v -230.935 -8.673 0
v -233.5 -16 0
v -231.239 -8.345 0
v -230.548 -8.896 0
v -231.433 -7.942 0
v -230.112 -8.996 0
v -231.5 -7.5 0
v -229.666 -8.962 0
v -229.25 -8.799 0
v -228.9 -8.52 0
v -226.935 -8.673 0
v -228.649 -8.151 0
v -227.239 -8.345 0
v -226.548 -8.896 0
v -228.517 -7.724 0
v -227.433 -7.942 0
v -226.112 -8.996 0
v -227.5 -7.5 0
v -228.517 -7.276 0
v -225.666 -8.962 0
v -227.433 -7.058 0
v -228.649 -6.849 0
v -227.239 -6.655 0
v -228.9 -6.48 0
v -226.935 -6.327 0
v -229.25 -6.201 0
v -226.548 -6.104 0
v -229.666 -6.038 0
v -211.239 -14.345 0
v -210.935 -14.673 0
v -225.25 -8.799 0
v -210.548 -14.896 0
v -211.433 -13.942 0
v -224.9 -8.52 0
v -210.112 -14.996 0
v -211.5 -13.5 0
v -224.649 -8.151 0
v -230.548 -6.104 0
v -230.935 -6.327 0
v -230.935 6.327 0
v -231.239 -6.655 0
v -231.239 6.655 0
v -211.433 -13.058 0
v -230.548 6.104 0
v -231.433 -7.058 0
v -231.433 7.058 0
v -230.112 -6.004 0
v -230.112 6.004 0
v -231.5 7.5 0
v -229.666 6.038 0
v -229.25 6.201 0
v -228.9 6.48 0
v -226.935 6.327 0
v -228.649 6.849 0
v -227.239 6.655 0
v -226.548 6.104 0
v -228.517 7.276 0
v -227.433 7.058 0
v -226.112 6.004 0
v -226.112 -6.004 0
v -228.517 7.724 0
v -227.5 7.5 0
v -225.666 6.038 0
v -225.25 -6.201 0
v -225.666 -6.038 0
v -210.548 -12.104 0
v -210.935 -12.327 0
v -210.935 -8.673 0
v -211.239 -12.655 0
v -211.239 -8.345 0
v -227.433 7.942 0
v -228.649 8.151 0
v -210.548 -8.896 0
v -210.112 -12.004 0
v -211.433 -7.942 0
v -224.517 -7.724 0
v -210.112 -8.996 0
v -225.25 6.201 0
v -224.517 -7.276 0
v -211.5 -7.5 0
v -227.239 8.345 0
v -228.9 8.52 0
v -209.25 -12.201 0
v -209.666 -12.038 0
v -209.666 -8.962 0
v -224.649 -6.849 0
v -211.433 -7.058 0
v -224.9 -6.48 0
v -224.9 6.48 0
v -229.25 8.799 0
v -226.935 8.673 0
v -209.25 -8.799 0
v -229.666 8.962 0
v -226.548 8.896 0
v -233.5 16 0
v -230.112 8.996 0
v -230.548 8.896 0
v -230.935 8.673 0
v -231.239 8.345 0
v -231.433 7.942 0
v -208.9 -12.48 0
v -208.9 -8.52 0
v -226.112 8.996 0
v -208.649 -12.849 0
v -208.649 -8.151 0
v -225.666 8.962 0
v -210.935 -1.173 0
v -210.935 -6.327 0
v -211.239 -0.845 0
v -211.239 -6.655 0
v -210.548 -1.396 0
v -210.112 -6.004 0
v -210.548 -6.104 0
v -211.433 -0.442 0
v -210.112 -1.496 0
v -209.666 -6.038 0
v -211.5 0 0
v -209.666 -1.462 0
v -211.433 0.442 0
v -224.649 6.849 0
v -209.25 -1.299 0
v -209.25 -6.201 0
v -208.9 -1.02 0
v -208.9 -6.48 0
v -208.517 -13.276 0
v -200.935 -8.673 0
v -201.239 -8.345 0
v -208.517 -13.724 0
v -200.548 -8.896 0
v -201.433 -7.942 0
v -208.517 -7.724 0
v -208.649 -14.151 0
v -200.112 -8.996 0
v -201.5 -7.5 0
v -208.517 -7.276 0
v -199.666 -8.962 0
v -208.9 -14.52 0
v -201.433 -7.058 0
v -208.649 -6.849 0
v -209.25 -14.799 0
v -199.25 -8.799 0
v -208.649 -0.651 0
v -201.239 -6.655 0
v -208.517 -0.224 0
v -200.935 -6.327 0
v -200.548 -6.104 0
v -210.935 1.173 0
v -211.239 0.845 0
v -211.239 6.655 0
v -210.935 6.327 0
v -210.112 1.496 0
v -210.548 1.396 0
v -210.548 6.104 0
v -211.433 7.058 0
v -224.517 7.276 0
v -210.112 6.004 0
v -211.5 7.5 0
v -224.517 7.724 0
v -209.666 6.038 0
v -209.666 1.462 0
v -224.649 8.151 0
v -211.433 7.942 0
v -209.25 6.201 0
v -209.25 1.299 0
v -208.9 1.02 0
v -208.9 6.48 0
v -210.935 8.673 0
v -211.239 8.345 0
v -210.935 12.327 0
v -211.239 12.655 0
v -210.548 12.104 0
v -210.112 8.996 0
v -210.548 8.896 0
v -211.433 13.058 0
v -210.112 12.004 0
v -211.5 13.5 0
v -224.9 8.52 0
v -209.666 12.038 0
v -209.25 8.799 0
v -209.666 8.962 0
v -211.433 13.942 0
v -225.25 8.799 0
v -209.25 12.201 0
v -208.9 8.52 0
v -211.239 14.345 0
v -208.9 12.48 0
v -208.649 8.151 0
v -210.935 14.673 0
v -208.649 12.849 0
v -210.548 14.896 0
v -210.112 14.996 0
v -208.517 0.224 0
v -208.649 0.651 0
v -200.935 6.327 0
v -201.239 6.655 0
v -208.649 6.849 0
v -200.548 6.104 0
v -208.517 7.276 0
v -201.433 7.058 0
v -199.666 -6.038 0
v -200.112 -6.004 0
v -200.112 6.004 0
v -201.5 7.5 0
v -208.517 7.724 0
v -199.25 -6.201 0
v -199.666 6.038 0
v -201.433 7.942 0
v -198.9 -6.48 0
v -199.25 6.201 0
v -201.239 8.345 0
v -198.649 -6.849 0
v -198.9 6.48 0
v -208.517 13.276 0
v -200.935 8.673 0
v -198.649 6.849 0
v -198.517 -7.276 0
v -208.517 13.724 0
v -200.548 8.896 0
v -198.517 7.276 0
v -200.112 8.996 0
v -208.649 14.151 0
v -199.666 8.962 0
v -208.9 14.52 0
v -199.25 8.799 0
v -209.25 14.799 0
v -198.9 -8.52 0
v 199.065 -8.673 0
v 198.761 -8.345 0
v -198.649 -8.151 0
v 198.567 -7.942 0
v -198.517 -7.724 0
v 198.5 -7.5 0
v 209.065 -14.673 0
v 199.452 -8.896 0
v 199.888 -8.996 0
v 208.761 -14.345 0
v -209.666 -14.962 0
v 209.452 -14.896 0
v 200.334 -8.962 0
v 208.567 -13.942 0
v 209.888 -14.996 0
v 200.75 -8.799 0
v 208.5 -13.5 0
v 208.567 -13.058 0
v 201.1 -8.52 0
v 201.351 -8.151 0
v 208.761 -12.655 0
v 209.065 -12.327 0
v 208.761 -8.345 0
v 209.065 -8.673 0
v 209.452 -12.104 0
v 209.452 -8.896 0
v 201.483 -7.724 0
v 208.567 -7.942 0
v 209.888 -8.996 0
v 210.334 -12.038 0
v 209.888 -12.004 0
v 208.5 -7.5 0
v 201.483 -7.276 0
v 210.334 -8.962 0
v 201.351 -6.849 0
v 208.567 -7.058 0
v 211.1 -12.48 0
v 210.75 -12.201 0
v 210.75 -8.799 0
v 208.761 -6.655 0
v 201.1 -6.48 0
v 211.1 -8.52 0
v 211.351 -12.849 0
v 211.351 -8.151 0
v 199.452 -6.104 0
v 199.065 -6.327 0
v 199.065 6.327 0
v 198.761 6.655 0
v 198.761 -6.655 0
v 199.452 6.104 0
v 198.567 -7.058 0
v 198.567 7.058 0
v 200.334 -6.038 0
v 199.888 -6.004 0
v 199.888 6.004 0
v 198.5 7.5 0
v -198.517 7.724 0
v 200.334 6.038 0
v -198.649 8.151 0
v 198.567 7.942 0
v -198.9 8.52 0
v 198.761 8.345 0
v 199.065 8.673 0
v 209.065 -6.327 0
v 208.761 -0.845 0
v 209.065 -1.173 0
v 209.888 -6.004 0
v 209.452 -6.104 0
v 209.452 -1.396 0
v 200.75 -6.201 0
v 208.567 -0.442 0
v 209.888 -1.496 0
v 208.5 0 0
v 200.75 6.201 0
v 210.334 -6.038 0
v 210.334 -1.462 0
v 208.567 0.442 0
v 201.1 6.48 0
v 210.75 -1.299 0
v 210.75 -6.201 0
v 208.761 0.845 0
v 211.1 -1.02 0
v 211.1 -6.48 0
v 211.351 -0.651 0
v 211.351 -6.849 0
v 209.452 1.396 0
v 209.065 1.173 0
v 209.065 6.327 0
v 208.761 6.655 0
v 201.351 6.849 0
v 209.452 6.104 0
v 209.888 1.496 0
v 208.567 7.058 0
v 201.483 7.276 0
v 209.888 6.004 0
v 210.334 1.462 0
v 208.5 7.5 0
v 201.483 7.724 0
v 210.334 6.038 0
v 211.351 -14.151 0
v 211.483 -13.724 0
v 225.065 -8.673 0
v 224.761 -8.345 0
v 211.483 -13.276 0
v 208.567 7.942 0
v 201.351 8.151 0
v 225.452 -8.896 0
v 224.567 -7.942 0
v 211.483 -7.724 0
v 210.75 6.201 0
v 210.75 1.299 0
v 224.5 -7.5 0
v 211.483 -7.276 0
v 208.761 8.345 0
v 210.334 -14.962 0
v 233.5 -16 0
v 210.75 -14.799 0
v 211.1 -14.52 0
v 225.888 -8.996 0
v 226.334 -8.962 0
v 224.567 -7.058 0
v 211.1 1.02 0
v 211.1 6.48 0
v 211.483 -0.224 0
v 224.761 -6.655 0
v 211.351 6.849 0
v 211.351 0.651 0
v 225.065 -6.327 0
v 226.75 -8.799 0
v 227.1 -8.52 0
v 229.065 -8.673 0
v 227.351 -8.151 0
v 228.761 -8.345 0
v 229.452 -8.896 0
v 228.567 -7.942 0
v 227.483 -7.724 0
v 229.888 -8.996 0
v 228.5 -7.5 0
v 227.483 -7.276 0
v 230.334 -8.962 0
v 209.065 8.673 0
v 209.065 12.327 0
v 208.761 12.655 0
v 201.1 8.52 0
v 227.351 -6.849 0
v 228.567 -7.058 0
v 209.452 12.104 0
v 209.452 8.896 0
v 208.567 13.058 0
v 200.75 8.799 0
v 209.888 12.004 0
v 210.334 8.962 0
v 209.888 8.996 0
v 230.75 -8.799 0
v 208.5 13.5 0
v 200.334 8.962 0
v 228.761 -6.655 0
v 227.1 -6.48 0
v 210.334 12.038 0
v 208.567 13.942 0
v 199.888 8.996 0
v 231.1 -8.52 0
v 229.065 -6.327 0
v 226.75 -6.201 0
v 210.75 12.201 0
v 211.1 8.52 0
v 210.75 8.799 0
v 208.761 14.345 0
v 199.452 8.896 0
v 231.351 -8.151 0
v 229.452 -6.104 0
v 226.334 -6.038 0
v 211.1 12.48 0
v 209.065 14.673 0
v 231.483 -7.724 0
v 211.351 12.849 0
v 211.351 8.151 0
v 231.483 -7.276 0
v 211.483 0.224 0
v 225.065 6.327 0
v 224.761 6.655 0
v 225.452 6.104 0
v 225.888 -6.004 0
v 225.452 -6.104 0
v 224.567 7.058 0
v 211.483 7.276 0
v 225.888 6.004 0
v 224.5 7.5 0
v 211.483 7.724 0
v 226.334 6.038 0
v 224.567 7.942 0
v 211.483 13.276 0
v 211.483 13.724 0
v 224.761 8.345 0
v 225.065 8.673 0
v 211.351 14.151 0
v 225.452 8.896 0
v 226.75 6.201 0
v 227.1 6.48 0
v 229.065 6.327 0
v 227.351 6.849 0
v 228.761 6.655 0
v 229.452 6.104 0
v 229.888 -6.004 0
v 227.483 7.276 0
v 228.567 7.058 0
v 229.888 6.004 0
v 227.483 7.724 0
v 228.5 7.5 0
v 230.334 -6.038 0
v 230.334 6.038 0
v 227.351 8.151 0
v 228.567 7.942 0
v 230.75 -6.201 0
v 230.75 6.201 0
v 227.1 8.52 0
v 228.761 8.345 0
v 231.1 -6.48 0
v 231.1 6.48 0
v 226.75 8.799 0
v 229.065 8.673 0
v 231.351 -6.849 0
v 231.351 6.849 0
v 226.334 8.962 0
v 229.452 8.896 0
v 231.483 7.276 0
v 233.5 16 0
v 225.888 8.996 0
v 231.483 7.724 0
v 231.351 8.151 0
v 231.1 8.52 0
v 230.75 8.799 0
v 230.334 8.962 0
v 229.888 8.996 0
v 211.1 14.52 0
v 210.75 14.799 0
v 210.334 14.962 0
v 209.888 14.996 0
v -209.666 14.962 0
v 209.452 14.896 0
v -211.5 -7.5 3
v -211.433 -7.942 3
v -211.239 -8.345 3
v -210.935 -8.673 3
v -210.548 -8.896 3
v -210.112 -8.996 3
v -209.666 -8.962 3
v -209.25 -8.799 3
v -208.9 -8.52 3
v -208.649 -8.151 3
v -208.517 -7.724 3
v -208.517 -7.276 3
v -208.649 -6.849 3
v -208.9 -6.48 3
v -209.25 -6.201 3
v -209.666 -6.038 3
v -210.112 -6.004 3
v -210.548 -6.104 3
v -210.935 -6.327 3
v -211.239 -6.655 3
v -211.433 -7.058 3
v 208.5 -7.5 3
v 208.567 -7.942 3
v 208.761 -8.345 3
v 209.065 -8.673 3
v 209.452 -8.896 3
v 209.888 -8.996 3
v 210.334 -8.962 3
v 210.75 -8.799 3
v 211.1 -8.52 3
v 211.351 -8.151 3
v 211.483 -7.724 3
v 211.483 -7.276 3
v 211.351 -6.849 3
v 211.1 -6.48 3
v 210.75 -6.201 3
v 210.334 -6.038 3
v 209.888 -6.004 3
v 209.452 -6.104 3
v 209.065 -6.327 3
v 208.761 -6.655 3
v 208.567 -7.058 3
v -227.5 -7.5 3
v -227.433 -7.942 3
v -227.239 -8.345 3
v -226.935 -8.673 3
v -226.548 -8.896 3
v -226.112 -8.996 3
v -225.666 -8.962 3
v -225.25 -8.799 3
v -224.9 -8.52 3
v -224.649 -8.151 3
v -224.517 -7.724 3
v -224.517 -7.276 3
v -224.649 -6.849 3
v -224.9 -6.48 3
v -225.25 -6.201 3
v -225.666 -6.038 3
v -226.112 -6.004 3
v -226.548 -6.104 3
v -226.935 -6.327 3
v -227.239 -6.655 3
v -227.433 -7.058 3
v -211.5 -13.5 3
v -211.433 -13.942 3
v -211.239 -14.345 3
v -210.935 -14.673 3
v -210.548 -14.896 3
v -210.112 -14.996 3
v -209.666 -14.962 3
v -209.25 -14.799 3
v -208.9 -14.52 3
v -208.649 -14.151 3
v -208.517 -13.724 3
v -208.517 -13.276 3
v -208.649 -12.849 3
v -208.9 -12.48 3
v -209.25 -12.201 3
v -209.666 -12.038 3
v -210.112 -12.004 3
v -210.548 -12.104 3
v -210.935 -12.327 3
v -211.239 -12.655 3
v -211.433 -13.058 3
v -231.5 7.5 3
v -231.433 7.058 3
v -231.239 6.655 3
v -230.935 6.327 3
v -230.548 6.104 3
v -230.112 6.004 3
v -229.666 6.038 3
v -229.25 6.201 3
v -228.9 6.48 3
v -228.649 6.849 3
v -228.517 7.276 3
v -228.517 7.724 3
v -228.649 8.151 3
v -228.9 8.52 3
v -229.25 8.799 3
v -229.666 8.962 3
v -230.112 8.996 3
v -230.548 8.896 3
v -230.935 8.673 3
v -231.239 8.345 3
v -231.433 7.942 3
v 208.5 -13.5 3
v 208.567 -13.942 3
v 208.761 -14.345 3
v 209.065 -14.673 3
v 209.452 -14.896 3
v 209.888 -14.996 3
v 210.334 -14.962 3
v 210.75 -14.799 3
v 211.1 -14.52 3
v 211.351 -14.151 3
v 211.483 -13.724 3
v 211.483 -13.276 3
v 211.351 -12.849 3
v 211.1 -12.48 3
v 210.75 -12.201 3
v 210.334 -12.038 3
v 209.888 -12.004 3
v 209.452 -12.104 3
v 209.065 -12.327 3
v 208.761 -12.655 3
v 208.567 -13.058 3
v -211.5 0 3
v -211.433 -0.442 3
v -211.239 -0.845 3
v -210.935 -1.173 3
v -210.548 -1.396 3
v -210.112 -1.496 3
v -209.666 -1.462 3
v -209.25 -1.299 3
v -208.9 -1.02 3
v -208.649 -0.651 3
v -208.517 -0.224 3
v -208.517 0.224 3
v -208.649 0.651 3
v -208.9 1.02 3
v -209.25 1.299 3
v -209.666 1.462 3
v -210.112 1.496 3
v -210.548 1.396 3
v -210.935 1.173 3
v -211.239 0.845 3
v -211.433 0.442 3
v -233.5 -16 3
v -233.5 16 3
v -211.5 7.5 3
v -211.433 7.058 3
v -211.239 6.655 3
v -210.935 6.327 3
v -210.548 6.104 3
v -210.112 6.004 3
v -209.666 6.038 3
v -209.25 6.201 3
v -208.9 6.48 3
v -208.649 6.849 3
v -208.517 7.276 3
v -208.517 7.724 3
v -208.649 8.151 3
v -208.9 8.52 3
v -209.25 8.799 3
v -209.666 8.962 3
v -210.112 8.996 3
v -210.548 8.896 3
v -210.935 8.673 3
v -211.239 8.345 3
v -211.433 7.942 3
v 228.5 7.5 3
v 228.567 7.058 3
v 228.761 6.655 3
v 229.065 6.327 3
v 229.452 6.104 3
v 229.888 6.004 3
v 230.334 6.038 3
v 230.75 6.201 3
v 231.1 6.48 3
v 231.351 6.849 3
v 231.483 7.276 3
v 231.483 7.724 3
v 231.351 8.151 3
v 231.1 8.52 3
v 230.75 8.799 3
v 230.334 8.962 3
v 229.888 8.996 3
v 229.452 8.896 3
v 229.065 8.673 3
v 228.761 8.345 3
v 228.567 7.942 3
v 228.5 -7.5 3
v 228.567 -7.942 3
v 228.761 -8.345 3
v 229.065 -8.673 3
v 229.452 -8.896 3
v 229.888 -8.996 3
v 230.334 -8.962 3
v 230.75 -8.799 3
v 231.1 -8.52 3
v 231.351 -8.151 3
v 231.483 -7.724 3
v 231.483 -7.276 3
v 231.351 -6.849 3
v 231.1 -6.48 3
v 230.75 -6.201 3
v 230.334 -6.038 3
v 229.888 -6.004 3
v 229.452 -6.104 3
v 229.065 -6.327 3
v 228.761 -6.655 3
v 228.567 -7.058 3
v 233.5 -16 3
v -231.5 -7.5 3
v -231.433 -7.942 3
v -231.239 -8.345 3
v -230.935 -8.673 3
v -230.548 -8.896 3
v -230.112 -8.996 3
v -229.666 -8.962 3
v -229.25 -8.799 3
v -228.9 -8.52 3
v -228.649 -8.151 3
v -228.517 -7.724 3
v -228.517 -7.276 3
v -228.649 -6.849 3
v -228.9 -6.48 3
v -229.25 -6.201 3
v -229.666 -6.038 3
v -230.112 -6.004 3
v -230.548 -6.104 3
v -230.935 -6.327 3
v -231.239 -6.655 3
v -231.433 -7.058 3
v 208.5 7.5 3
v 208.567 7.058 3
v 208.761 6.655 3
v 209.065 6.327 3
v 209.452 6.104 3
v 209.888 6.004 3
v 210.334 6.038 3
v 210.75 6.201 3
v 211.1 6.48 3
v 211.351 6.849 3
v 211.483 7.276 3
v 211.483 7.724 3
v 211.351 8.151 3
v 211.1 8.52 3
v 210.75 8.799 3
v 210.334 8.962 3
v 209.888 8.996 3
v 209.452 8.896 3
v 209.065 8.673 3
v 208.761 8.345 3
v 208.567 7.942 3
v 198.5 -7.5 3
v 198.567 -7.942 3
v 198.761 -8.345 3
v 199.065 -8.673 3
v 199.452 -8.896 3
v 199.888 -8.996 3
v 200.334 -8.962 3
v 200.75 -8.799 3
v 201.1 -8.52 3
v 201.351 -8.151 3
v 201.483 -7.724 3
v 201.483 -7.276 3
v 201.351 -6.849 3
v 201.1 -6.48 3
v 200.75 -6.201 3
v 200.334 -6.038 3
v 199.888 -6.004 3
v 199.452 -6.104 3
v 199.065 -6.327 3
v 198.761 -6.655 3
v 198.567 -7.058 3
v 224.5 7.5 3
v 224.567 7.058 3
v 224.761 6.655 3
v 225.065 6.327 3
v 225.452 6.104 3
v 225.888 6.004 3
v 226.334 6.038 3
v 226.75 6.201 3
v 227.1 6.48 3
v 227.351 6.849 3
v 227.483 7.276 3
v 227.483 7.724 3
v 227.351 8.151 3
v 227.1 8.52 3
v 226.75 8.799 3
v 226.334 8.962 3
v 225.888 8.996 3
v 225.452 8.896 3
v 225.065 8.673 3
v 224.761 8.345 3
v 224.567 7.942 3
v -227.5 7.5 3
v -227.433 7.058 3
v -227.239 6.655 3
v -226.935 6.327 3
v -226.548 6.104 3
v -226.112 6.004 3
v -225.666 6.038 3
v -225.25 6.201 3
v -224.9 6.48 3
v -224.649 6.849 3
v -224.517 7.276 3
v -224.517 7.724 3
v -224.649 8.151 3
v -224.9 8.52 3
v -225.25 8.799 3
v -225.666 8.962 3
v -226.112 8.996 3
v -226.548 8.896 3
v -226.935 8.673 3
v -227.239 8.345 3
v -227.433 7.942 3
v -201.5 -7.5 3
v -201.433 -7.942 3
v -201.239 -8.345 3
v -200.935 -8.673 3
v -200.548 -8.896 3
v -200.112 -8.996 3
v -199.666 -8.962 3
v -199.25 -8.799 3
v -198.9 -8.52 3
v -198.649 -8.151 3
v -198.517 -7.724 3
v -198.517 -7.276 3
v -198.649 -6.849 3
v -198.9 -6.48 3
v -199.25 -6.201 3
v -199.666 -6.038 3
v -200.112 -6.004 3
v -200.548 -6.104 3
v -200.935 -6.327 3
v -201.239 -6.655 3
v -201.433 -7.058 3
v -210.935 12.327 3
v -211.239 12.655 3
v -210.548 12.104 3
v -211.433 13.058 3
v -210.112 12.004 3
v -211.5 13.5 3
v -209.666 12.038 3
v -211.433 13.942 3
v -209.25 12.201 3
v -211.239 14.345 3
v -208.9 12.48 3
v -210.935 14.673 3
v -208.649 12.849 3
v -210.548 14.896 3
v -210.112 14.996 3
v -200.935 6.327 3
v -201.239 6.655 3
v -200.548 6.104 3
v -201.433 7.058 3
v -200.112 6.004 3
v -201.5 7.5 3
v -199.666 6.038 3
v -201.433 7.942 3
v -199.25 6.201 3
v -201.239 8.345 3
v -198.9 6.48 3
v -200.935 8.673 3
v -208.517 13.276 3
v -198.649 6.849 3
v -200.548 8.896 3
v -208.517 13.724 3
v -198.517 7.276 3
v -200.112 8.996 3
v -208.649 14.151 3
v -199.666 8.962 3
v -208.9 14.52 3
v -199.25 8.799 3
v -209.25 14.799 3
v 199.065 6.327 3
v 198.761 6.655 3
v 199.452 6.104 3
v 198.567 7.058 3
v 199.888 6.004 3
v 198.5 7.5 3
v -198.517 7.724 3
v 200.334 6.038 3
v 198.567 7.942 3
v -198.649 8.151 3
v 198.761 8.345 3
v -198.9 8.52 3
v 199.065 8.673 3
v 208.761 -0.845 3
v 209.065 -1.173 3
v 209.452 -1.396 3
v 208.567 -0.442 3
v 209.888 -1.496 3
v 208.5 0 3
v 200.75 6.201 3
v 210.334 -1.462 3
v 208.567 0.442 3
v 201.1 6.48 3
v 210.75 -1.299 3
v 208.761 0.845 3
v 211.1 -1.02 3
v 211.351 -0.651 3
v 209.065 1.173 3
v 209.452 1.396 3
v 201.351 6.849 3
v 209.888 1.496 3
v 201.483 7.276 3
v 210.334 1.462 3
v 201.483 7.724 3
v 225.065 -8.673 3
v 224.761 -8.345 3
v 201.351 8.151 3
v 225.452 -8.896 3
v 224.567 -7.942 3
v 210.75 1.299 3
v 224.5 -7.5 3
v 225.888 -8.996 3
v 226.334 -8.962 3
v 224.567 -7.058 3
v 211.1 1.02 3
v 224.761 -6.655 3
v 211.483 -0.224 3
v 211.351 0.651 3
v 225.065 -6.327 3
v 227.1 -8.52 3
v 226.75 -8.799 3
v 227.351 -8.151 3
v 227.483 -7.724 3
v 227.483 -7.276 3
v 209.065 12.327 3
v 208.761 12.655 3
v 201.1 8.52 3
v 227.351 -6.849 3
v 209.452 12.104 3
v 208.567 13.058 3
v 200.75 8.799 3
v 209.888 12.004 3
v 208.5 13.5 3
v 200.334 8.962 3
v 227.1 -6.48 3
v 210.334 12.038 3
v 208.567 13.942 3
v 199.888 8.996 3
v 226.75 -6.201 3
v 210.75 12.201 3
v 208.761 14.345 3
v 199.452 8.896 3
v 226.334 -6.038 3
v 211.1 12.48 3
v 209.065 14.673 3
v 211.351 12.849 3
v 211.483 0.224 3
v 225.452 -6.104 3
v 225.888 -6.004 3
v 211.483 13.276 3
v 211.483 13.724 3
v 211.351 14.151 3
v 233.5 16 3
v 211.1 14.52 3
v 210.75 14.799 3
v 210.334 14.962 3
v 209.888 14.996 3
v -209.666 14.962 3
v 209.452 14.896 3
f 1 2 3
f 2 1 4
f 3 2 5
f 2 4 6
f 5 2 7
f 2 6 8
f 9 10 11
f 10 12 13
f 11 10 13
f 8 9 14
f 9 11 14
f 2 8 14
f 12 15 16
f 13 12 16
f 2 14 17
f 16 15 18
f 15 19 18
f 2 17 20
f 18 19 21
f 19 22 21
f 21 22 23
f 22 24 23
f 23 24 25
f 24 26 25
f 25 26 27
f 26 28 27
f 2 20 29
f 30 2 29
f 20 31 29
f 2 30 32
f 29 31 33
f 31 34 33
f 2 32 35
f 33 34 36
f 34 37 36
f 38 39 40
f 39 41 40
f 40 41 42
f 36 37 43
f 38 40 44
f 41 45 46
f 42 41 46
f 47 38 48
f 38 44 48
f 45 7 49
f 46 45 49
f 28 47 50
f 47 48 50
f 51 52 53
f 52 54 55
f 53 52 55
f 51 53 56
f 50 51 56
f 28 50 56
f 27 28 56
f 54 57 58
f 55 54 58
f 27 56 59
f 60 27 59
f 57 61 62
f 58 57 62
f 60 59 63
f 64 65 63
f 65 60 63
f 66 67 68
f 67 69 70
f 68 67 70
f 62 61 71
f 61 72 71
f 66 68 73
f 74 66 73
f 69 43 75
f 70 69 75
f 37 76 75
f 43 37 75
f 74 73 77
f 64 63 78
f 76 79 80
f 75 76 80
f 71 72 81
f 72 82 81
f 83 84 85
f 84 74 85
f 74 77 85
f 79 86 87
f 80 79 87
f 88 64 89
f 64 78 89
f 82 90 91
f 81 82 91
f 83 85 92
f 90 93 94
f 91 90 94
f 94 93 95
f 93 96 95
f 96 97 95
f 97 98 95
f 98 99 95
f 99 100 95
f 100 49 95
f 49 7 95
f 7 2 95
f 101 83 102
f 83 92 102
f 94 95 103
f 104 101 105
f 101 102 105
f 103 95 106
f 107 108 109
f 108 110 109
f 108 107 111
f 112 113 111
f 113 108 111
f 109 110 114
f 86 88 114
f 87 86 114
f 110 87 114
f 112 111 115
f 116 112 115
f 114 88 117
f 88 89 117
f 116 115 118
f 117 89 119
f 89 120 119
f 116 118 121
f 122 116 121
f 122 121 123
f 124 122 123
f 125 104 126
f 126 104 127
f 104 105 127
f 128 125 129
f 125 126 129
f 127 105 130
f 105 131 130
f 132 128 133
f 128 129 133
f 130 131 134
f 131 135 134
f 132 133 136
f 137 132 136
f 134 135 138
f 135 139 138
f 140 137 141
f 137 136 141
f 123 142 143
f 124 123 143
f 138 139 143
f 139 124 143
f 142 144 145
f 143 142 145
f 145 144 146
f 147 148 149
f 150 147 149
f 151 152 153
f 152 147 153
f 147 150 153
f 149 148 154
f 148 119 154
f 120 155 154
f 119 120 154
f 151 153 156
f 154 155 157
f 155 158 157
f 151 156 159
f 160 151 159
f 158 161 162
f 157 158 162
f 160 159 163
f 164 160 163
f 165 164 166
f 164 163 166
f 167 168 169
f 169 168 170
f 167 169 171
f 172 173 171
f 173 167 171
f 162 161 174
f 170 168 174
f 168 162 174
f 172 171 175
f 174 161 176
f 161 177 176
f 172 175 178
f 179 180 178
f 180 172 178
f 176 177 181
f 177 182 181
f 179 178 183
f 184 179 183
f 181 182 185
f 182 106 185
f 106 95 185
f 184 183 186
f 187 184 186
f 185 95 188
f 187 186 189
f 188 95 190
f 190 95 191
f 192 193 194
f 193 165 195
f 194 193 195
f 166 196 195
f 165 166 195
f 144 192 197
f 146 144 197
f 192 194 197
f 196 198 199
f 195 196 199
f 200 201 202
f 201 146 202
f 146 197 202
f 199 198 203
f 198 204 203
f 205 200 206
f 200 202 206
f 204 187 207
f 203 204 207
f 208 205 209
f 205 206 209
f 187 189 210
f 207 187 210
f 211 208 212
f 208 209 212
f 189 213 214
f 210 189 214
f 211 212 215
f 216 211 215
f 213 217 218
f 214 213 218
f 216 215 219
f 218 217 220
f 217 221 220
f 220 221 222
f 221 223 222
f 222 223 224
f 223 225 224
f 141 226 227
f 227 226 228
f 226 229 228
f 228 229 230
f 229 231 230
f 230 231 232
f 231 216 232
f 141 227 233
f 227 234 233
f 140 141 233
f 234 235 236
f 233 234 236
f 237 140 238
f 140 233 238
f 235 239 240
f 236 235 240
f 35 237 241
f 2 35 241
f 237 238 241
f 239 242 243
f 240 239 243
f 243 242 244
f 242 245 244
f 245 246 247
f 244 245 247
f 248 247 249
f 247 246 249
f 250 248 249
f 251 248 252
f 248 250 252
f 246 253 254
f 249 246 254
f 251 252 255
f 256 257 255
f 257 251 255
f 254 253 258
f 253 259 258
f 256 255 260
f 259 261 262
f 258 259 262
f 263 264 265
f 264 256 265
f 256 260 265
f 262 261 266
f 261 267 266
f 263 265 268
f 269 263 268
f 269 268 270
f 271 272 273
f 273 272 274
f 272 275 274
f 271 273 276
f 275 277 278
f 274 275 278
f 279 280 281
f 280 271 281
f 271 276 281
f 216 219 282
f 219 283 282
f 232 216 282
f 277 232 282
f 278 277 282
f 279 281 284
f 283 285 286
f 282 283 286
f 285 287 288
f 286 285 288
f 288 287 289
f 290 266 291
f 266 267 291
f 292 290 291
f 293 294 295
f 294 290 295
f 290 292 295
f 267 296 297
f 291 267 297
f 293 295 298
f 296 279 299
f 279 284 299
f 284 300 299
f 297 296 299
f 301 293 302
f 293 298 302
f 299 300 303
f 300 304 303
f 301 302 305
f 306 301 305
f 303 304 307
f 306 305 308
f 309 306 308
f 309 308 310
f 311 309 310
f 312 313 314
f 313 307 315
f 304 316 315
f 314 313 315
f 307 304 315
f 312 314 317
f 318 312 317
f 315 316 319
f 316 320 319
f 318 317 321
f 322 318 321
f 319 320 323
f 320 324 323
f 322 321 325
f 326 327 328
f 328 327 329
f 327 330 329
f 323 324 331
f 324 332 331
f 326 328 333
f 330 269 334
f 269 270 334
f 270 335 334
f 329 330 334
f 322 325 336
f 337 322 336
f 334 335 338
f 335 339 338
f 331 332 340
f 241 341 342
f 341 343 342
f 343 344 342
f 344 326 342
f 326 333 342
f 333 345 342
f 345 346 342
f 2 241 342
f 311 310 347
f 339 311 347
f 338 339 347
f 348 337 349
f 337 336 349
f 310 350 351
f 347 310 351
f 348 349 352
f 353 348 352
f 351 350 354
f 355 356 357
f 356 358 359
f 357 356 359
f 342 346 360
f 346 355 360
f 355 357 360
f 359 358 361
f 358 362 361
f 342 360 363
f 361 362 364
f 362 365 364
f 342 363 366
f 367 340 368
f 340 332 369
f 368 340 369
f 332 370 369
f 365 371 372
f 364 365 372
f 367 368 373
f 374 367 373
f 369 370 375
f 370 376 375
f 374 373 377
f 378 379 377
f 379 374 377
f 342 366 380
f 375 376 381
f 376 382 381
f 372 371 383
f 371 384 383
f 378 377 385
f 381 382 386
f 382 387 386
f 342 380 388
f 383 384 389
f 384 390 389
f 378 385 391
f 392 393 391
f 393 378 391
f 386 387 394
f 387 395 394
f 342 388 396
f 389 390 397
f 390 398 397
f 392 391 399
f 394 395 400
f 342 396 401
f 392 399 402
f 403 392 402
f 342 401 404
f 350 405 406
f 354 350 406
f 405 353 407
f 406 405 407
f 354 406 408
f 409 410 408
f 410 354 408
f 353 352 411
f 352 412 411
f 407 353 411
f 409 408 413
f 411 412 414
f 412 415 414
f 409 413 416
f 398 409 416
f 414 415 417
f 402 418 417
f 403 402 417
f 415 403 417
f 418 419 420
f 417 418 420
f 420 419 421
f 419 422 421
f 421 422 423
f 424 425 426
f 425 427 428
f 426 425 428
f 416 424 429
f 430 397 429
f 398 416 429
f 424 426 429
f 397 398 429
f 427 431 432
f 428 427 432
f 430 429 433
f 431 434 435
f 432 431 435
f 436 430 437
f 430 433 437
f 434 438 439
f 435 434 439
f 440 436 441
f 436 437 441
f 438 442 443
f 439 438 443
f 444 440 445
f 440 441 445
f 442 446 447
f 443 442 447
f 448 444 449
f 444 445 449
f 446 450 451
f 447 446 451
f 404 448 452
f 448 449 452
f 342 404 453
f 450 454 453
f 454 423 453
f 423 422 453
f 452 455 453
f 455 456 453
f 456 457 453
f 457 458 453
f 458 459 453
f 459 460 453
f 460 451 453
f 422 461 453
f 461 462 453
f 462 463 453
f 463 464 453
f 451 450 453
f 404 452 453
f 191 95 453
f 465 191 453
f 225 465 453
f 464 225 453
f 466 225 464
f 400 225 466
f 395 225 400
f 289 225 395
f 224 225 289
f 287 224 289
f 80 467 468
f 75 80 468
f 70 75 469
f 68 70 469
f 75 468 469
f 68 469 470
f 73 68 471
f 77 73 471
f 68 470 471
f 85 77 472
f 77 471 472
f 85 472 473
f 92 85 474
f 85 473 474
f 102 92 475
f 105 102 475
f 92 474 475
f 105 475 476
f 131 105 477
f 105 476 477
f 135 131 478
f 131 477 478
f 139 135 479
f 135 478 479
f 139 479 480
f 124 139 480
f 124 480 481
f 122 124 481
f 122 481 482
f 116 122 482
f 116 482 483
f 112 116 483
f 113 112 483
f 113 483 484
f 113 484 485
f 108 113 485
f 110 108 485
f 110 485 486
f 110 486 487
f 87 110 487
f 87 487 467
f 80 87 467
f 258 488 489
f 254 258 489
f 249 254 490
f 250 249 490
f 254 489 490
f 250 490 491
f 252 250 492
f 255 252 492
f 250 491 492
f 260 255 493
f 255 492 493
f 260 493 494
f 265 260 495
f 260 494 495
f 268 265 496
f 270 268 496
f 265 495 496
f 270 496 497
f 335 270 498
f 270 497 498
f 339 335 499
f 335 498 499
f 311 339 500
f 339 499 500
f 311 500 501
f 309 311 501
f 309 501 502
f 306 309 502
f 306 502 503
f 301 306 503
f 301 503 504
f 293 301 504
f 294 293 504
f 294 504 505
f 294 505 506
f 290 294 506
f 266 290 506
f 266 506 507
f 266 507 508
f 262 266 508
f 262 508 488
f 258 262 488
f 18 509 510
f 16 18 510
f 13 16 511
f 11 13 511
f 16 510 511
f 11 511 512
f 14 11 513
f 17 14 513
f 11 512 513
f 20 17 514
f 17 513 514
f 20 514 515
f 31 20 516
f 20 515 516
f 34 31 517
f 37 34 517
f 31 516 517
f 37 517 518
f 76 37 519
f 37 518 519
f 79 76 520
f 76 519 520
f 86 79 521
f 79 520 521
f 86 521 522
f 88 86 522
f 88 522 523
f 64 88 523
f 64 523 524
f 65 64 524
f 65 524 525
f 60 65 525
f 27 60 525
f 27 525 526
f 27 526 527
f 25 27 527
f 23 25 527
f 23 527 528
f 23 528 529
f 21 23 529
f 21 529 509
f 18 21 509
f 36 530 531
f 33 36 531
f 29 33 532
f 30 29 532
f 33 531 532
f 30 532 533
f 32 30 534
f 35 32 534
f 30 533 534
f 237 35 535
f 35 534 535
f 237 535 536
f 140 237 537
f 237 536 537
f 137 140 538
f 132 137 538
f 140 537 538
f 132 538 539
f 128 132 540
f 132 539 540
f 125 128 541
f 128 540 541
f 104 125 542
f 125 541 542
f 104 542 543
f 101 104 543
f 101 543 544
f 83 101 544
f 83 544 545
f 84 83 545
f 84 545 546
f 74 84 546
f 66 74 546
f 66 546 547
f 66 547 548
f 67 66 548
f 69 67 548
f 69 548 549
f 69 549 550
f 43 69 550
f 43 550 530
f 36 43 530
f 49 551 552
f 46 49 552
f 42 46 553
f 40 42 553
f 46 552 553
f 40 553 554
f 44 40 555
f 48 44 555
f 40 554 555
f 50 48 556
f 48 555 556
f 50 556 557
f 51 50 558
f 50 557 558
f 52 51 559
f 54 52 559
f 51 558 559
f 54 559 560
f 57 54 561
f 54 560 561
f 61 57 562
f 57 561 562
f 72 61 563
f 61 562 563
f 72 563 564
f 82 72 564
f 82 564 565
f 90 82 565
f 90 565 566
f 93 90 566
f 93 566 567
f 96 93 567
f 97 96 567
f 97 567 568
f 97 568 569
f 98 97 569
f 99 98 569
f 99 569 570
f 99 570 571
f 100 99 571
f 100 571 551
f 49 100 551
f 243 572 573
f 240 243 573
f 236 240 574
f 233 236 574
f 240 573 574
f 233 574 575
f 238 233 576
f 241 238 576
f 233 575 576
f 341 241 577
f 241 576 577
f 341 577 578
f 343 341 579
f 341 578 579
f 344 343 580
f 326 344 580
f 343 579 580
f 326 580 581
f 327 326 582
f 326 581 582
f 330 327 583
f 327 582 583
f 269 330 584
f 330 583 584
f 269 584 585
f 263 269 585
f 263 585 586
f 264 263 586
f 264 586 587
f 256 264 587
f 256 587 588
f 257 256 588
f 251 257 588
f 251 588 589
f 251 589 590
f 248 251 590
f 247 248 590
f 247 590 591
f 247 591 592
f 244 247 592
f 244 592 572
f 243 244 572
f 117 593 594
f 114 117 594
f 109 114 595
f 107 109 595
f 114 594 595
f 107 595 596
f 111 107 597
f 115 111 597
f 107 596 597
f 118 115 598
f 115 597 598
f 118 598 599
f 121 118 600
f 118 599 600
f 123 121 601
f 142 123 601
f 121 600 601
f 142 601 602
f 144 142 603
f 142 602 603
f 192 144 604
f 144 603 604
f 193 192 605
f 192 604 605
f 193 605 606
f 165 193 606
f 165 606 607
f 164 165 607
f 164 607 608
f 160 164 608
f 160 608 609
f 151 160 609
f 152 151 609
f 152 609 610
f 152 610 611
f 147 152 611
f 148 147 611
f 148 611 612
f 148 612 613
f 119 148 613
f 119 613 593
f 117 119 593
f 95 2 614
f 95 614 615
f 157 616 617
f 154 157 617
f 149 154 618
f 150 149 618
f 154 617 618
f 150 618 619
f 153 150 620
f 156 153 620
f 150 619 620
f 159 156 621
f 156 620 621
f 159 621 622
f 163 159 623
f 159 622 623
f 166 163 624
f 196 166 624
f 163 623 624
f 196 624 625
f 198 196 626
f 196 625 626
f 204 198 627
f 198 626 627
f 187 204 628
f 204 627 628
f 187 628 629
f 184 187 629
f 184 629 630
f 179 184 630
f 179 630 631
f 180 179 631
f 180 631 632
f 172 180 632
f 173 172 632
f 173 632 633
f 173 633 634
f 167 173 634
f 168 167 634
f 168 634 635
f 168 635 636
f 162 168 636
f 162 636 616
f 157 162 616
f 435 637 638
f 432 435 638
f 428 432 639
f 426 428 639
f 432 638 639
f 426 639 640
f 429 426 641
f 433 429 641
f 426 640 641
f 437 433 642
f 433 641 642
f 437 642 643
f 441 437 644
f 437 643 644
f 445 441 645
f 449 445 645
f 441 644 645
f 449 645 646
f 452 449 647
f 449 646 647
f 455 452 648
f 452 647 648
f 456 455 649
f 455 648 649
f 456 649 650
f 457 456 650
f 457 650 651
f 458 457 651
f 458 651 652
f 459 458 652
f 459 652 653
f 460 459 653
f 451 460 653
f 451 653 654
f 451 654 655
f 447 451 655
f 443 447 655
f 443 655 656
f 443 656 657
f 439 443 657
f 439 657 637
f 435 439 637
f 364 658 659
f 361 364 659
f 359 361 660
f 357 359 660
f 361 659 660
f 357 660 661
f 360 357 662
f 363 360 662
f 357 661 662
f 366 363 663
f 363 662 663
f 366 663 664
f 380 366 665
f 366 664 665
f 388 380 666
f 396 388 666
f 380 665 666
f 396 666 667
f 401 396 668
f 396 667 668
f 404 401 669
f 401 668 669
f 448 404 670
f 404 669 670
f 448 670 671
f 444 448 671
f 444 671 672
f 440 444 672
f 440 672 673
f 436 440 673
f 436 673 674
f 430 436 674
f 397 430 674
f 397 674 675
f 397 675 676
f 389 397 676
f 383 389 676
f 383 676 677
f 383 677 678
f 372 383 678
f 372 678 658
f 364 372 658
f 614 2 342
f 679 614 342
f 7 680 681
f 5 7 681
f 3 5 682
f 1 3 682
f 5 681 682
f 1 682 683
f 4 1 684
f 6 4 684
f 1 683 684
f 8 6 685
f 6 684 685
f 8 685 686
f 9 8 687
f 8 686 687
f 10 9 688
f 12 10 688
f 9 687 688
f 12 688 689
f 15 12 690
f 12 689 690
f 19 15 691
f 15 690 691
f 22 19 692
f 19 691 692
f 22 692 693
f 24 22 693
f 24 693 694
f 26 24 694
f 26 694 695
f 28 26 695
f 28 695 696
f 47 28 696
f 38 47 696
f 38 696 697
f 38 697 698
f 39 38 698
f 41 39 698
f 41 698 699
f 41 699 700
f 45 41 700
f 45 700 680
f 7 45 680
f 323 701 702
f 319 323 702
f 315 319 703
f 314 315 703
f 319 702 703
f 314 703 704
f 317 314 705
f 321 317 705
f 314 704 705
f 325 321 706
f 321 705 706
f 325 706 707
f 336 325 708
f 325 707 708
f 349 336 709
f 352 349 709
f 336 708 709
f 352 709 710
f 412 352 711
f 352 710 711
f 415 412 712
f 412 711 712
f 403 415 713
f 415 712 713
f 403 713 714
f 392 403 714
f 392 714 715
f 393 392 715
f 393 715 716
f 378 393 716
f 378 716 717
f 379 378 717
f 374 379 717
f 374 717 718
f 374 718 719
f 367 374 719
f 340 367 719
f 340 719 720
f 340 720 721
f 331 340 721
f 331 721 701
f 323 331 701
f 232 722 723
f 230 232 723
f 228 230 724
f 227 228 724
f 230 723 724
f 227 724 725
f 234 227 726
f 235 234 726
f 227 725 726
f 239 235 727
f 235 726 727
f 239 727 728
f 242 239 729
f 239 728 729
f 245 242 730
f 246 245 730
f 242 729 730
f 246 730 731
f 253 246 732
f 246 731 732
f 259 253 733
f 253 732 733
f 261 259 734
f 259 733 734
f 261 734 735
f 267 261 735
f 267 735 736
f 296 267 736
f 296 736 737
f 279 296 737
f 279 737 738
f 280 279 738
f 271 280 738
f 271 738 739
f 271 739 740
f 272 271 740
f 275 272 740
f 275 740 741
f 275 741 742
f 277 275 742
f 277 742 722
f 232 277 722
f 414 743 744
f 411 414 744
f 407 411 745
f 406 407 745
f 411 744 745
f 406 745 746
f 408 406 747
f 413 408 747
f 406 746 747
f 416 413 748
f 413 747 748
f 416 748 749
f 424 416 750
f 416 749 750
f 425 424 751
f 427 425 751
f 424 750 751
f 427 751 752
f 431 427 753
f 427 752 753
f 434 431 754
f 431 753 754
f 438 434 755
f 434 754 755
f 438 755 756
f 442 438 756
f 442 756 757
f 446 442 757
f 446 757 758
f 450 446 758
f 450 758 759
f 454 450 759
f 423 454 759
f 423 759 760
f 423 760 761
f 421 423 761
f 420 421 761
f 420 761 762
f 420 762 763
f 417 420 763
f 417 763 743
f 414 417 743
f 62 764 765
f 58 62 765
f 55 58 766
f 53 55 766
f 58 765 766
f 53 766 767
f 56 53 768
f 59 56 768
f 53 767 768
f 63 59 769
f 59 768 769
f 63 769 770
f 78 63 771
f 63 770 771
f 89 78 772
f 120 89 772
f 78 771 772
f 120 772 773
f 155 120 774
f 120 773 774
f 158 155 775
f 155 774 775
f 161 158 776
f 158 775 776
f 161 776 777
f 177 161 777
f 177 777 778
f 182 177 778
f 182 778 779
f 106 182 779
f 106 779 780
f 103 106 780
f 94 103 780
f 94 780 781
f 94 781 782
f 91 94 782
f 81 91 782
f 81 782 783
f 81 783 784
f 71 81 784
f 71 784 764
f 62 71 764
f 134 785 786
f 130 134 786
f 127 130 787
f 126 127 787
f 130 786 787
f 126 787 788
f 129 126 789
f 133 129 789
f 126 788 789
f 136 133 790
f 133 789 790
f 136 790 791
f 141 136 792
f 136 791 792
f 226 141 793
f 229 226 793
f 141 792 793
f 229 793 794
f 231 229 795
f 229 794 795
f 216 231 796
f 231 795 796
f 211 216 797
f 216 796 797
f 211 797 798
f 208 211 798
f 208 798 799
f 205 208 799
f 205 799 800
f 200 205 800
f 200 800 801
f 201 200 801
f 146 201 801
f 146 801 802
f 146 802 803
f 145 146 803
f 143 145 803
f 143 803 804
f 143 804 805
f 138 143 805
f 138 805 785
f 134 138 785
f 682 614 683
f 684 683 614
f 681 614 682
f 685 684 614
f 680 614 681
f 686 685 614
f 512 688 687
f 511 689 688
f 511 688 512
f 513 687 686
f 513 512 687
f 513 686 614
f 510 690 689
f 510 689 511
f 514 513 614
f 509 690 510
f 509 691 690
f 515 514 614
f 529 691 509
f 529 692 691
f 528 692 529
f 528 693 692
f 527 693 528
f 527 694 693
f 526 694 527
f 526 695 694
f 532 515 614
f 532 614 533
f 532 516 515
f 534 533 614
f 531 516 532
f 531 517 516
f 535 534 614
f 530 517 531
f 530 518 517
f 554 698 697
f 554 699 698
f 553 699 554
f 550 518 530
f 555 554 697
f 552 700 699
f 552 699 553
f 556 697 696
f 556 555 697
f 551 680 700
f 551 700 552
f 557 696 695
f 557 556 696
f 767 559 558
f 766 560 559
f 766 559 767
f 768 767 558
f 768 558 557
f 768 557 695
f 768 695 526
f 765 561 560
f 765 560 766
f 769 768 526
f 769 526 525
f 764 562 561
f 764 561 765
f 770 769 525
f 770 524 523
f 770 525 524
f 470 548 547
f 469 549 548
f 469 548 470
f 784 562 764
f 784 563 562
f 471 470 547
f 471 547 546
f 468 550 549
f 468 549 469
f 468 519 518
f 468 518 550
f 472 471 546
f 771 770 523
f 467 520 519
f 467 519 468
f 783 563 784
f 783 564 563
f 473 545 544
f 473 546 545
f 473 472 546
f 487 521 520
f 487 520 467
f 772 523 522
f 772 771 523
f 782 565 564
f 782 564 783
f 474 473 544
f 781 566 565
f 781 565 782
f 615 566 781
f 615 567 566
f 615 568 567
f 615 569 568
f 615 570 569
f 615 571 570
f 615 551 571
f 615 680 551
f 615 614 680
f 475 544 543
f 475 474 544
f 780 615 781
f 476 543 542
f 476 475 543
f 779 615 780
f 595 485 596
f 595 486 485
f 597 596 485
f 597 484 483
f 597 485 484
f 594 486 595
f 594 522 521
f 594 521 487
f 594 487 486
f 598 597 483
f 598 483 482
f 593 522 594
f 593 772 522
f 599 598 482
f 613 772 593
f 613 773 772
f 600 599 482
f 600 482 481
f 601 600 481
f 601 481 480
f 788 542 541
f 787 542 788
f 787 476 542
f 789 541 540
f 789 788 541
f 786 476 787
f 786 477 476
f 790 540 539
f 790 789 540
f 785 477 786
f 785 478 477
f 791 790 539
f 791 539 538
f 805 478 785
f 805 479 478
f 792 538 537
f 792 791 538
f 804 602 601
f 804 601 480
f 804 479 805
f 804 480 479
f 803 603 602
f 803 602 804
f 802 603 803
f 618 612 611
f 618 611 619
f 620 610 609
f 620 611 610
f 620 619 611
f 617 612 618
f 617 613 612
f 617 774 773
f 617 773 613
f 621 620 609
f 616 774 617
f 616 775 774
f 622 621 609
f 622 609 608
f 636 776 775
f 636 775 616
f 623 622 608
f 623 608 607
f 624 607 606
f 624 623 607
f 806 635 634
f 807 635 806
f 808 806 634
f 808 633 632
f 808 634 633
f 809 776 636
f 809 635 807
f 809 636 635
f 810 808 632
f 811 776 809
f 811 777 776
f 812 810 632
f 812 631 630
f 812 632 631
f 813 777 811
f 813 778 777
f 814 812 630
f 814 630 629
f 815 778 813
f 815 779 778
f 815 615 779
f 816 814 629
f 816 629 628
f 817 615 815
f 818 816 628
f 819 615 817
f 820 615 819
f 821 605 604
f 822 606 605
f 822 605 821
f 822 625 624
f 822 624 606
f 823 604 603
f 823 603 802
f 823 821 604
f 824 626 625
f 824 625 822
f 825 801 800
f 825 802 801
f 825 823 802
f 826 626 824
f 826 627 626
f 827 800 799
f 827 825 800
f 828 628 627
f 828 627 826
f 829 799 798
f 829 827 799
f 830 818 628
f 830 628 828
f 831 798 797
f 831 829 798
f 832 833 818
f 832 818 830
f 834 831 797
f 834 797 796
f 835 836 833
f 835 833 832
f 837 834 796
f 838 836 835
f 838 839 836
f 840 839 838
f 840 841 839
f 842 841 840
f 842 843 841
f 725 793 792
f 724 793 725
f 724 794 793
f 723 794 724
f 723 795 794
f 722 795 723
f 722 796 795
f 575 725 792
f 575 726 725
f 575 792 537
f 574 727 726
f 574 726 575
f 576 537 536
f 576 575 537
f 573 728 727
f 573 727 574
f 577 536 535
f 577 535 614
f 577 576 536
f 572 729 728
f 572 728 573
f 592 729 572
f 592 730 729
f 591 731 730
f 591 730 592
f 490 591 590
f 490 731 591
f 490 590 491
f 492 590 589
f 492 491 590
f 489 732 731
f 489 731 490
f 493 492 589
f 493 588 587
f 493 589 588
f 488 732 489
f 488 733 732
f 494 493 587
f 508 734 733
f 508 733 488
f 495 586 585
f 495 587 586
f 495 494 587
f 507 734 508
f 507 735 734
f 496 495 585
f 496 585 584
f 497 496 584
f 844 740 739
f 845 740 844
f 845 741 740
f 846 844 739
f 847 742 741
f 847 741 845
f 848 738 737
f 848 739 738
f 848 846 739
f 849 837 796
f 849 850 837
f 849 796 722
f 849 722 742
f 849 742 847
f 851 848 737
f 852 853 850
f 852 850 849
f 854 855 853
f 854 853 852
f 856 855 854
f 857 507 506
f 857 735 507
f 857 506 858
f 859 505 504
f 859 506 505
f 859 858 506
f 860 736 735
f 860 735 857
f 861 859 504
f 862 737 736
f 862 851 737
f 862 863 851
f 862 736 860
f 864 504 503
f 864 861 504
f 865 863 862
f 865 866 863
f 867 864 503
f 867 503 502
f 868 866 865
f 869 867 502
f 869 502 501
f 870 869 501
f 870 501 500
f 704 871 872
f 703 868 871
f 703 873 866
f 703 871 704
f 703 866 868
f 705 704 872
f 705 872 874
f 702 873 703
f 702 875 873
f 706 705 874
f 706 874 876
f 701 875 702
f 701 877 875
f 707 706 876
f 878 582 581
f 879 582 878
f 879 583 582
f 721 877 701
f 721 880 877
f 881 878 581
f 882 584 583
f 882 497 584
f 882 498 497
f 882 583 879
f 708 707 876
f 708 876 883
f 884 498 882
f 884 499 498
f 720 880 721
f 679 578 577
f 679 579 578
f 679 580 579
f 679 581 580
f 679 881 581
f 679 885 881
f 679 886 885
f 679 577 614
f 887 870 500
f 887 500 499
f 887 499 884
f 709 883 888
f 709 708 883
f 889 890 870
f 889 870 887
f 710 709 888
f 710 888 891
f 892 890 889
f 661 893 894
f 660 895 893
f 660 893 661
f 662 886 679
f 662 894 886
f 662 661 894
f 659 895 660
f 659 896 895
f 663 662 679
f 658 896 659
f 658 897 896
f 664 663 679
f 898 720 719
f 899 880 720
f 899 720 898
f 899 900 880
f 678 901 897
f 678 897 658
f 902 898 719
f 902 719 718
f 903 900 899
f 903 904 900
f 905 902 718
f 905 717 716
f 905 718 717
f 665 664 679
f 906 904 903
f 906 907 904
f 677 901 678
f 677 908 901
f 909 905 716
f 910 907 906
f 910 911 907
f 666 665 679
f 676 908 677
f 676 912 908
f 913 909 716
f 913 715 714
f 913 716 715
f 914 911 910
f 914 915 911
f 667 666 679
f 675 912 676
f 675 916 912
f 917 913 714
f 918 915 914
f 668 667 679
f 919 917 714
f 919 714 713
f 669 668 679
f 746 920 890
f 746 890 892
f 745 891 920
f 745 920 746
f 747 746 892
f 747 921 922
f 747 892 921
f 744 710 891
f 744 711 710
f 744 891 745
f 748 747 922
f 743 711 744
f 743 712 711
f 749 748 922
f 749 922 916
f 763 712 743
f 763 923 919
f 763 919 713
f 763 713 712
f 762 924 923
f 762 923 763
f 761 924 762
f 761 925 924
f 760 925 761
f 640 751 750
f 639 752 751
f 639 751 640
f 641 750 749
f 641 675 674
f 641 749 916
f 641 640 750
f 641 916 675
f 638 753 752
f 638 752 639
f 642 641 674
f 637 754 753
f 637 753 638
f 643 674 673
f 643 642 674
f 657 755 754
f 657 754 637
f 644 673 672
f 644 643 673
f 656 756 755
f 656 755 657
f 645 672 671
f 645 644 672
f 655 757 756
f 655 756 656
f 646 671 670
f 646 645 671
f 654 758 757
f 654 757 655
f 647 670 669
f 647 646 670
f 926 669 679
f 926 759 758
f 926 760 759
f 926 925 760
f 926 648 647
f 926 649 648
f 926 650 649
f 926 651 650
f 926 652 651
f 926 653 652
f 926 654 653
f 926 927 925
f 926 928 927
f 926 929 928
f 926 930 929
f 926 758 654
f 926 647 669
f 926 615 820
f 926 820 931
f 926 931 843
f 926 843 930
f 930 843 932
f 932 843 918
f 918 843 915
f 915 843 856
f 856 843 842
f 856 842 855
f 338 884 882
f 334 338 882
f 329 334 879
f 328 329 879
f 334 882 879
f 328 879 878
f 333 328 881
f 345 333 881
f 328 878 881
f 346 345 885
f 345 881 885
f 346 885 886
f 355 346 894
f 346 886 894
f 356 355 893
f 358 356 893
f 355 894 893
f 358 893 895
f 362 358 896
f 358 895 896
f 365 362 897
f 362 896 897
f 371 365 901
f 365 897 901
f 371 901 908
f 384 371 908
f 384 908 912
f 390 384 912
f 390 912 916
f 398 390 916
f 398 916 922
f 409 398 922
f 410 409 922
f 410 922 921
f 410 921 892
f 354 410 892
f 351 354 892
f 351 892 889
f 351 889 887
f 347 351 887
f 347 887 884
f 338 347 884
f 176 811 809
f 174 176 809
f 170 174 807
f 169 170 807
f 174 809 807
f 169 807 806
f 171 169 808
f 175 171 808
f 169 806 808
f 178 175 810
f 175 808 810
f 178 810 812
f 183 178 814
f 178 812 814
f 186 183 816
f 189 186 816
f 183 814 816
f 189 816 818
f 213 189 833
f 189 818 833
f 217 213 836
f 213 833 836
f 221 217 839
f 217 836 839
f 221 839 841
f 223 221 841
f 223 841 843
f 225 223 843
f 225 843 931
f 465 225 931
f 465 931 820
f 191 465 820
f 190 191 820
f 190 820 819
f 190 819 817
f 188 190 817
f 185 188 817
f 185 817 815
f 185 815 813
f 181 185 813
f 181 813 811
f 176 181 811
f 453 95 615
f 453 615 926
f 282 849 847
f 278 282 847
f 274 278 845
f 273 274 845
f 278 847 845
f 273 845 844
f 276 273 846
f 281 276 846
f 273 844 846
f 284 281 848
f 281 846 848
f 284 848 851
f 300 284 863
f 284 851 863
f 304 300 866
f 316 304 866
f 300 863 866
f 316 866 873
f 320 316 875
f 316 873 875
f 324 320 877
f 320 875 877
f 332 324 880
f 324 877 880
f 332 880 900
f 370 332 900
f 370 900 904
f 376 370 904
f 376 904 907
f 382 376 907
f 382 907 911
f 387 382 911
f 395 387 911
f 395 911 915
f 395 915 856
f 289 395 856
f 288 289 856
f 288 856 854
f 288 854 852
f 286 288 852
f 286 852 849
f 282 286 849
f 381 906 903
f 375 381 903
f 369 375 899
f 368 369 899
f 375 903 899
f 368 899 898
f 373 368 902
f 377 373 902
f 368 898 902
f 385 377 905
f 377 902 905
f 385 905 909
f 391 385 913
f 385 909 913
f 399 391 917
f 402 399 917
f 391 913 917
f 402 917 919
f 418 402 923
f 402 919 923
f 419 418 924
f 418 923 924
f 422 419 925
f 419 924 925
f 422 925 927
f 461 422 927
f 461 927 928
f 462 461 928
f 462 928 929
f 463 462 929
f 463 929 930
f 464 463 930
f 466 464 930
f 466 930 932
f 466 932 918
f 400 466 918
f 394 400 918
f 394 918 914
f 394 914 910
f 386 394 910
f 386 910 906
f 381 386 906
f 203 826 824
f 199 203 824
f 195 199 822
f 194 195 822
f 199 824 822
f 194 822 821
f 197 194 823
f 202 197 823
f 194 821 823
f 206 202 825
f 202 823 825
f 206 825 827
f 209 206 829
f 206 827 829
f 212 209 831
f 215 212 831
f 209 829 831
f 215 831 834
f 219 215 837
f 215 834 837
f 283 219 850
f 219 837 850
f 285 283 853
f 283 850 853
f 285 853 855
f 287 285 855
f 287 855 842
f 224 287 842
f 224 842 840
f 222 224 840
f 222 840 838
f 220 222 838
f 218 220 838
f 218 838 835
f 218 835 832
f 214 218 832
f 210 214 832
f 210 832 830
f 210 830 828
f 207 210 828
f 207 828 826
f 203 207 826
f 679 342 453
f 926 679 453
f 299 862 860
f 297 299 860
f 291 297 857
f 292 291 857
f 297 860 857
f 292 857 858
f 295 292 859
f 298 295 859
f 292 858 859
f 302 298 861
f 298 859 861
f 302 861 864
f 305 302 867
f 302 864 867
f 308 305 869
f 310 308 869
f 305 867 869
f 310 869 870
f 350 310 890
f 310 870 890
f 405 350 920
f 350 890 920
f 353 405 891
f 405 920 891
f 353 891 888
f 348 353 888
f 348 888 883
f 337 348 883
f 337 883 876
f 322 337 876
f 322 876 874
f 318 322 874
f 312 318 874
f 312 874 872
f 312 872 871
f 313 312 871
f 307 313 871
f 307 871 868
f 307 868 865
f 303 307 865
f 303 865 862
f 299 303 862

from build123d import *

# Parameters (mm, degrees)
F0_W     = 467
F0_H     = 32
F0_W_2   = 400
F0_H_2   = 15
F0_W_3   = 16
F0_W_4   = 10
F0_W_5   = 4
F1_DEPTH = 3
F2_D     = 3


# Not quite as in the source:
# - a feature names something its author has since deleted; it is built from what else it names


with BuildPart() as f1:
    # F0 (on Top) → F1 (new body)
    with BuildSketch(Plane.XY):
        Rectangle(F0_W, F0_H)
        Polygon((226, -7.5), (210, -7.5), (200, -7.5), (-200, -7.5), (-210, -7.5), (-226, -7.5), (-230, -7.5), (-230, 7.5), (-226, 7.5), (-210, 7.5), (-200, 7.5), (200, 7.5), (210, 7.5), (226, 7.5), (230, 7.5), (230, -7.5), align=None, mode=Mode.SUBTRACT)
        Rectangle(F0_W_2, F0_H_2)
        with Locations((218, 0)):
            Rectangle(F0_W_3, F0_H_2)
        with Locations((-218, 0)):
            Rectangle(F0_W_3, F0_H_2)
        with Locations((205, 0)):
            Rectangle(F0_W_4, F0_H_2)
        with Locations((-205, 0)):
            Rectangle(F0_W_4, F0_H_2)
        with Locations((-228, 0)):
            Rectangle(F0_W_5, F0_H_2)
        with Locations((228, 0)):
            Rectangle(F0_W_5, F0_H_2)
    extrude(amount=F1_DEPTH)

    # F2 (through all)
    with Locations(Plane(origin=(0, 0, 0), x_dir=(1, 0, 0), z_dir=(0, 0, -1))):
        with Locations((210, 7.5), (210, -7.5), (230, -7.5), (230, 7.5), (-210, 7.5), (-210, -7.5), (-230, -7.5), (-230, 7.5), (210, 13.5), (-210, 13.5), (-210, -13.5), (210, -13.5), (226, 7.5), (226, -7.5), (-226, 7.5), (-226, -7.5), (200, 7.5), (200, -7.5), (-200, -7.5), (-200, 7.5), (-210, 0), (210, 0)):
            Hole(F2_D / 2)


solid = f1.part
